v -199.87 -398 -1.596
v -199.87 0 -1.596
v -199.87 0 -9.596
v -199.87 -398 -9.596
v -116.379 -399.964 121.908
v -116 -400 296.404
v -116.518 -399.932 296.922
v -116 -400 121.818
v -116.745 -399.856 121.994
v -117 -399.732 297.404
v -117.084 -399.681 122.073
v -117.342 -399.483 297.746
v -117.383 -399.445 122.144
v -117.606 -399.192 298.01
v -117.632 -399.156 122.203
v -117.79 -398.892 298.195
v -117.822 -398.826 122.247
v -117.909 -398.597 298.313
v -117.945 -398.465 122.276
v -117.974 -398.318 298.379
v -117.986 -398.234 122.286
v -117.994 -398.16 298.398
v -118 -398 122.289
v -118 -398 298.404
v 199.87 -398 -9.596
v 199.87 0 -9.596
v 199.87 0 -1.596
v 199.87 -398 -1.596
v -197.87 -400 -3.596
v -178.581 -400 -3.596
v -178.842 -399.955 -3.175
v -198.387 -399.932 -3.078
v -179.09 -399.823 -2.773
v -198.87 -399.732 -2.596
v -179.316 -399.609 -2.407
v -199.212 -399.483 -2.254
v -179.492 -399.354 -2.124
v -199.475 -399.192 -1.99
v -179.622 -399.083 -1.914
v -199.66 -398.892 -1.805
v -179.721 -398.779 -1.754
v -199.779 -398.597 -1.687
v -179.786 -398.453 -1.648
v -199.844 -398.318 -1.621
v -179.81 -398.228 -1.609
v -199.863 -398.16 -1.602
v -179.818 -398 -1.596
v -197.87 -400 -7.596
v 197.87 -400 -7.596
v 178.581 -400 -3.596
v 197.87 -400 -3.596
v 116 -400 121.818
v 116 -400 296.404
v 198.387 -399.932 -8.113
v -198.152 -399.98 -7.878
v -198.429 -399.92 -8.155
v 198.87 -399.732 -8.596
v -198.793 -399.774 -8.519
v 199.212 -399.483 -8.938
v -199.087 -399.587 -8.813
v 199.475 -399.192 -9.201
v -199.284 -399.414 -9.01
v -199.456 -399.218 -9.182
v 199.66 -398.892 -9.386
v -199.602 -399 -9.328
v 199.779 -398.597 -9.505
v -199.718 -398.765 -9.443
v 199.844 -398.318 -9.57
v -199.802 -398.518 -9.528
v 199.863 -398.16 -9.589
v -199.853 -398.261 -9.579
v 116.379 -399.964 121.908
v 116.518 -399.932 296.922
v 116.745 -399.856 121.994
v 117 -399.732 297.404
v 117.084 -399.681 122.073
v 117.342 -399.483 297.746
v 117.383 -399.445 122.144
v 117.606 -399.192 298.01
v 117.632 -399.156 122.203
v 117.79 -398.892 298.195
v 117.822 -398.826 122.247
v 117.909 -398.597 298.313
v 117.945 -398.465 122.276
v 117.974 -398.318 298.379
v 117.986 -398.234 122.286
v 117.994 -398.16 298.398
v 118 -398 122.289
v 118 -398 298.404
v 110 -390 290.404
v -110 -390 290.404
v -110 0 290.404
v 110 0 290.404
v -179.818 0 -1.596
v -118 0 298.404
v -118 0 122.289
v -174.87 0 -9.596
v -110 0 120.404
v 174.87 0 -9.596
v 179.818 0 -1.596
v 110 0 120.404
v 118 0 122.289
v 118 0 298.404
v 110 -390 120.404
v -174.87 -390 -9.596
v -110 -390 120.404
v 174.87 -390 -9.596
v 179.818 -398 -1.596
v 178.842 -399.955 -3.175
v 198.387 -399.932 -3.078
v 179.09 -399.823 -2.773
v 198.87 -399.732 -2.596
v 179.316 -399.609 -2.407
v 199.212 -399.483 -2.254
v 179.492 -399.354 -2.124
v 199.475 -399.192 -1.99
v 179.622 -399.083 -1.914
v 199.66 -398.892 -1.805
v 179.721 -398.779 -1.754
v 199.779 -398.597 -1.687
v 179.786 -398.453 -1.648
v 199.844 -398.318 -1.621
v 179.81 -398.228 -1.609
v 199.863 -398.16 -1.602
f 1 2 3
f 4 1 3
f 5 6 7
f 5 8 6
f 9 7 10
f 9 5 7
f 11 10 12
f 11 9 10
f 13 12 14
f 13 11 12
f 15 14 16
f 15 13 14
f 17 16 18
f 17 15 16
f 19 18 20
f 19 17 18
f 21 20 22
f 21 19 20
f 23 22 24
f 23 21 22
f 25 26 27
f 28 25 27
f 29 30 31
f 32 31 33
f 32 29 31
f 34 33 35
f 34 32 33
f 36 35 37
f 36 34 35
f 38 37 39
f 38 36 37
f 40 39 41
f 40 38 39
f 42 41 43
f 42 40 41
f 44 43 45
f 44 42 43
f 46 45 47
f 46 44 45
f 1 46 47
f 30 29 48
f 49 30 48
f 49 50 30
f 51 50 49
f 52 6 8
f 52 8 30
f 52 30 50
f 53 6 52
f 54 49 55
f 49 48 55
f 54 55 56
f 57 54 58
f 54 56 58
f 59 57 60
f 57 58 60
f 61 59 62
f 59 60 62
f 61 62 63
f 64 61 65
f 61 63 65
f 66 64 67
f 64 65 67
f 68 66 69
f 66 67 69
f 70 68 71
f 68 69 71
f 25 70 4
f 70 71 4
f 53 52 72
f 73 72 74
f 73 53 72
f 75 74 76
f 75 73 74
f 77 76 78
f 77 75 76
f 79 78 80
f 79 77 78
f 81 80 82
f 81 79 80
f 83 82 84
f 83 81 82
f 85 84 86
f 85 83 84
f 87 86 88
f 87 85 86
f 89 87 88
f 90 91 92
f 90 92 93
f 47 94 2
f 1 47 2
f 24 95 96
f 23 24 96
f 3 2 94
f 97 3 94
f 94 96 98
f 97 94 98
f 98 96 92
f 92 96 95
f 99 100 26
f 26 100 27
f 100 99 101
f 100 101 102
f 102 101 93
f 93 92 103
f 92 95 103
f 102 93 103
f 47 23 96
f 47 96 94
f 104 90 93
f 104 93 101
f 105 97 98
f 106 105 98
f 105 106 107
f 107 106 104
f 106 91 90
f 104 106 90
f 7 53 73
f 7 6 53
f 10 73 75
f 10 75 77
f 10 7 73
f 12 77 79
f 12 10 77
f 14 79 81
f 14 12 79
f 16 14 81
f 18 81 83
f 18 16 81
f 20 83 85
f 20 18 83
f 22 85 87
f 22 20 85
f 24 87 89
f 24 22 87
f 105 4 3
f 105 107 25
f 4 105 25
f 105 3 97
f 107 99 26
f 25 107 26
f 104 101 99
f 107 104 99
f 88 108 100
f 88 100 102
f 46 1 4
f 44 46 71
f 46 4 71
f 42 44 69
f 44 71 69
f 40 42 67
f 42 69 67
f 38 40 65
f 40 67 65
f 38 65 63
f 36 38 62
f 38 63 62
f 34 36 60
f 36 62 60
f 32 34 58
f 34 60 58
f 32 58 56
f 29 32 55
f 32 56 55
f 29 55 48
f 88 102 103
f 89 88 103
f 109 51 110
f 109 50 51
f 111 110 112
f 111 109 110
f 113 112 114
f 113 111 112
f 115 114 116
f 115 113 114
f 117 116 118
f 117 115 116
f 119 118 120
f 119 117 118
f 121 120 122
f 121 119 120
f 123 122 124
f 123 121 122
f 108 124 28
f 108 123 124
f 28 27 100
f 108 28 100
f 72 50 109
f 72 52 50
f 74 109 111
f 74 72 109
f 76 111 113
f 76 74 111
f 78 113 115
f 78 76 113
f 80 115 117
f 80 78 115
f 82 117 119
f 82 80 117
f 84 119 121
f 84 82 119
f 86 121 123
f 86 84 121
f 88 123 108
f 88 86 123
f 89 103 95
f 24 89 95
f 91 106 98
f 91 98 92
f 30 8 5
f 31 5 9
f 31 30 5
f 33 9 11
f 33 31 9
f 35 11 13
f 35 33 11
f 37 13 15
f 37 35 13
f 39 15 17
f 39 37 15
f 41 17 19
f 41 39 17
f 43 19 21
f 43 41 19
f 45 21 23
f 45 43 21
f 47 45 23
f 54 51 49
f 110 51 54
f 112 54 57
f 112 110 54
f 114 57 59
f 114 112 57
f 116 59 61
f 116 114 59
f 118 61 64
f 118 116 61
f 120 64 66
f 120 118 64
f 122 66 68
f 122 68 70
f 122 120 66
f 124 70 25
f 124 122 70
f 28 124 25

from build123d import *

# Parameters (mm, degrees)
F2_DEPTH = 400
F5_DEPTH = 10
F8_R     = 2


with BuildPart() as f2:
    # F1 (on Front) → F2 (new body)
    with BuildSketch(Plane.XZ):
        Polygon((-199.8697698991, -1.5957240637), (-199.8697698991, -9.5957240637), (-174.8697698991, -9.5957240637), (-110, 120.4042759363), (-110, 290.4042759363), (0, 290.4042759363), (0, 298.4042759363), (-118, 298.4042759363), (-118, 122.289434411), (-179.8184748013, -1.5957240637), align=None)
        Polygon((0, 298.4042759363), (0, 290.4042759363), (110, 290.4042759363), (110, 120.4042759363), (174.8697698991, -9.5957240637), (199.8697698991, -9.5957240637), (199.8697698991, -1.5957240637), (179.8184748013, -1.5957240637), (118, 122.289434411), (118, 298.4042759363), align=None)
    extrude(amount=F2_DEPTH)


with BuildPart() as f5:
    # F4 (on offset) → F5 (new body)
    with BuildSketch(Plane.XZ.offset(400)):
        Polygon((118, 298.4042759363), (-118, 298.4042759363), (-118, 122.289434411), (-179.548561573, -1.5957240637), (-199.8697698991, -1.5957240637), (-199.8697698991, -9.5957240637), (199.8697698991, -9.5957240637), (199.8697698991, -1.5957240637), (179.7748506069, -1.5957240637), (118, 122.289434411), align=None)
    extrude(amount=-F5_DEPTH)

    # F6: cut F2
    add(f2.part, mode=Mode.SUBTRACT)

    # F7: union F2
    add(f2.part)

    # F8
    f8_edges = [f5.edges().sort_by_distance(p)[0] for p in [
        (-189.844122, -400, -1.595724),
        (-199.86977, -400, -5.595724),
        (0, -400, -9.595724),
        (199.86977, -400, -5.595724),
        (189.844122, -400, -1.595724),
        (148.909237, -400, 60.346855),
        (118, -400, 210.346855),
        (0, -400, 298.404276),
        (-118, -400, 210.346855),
        (-148.909237, -400, 60.346855),
    ]]
    fillet(f8_edges, radius=F8_R)


solid = f5.part
